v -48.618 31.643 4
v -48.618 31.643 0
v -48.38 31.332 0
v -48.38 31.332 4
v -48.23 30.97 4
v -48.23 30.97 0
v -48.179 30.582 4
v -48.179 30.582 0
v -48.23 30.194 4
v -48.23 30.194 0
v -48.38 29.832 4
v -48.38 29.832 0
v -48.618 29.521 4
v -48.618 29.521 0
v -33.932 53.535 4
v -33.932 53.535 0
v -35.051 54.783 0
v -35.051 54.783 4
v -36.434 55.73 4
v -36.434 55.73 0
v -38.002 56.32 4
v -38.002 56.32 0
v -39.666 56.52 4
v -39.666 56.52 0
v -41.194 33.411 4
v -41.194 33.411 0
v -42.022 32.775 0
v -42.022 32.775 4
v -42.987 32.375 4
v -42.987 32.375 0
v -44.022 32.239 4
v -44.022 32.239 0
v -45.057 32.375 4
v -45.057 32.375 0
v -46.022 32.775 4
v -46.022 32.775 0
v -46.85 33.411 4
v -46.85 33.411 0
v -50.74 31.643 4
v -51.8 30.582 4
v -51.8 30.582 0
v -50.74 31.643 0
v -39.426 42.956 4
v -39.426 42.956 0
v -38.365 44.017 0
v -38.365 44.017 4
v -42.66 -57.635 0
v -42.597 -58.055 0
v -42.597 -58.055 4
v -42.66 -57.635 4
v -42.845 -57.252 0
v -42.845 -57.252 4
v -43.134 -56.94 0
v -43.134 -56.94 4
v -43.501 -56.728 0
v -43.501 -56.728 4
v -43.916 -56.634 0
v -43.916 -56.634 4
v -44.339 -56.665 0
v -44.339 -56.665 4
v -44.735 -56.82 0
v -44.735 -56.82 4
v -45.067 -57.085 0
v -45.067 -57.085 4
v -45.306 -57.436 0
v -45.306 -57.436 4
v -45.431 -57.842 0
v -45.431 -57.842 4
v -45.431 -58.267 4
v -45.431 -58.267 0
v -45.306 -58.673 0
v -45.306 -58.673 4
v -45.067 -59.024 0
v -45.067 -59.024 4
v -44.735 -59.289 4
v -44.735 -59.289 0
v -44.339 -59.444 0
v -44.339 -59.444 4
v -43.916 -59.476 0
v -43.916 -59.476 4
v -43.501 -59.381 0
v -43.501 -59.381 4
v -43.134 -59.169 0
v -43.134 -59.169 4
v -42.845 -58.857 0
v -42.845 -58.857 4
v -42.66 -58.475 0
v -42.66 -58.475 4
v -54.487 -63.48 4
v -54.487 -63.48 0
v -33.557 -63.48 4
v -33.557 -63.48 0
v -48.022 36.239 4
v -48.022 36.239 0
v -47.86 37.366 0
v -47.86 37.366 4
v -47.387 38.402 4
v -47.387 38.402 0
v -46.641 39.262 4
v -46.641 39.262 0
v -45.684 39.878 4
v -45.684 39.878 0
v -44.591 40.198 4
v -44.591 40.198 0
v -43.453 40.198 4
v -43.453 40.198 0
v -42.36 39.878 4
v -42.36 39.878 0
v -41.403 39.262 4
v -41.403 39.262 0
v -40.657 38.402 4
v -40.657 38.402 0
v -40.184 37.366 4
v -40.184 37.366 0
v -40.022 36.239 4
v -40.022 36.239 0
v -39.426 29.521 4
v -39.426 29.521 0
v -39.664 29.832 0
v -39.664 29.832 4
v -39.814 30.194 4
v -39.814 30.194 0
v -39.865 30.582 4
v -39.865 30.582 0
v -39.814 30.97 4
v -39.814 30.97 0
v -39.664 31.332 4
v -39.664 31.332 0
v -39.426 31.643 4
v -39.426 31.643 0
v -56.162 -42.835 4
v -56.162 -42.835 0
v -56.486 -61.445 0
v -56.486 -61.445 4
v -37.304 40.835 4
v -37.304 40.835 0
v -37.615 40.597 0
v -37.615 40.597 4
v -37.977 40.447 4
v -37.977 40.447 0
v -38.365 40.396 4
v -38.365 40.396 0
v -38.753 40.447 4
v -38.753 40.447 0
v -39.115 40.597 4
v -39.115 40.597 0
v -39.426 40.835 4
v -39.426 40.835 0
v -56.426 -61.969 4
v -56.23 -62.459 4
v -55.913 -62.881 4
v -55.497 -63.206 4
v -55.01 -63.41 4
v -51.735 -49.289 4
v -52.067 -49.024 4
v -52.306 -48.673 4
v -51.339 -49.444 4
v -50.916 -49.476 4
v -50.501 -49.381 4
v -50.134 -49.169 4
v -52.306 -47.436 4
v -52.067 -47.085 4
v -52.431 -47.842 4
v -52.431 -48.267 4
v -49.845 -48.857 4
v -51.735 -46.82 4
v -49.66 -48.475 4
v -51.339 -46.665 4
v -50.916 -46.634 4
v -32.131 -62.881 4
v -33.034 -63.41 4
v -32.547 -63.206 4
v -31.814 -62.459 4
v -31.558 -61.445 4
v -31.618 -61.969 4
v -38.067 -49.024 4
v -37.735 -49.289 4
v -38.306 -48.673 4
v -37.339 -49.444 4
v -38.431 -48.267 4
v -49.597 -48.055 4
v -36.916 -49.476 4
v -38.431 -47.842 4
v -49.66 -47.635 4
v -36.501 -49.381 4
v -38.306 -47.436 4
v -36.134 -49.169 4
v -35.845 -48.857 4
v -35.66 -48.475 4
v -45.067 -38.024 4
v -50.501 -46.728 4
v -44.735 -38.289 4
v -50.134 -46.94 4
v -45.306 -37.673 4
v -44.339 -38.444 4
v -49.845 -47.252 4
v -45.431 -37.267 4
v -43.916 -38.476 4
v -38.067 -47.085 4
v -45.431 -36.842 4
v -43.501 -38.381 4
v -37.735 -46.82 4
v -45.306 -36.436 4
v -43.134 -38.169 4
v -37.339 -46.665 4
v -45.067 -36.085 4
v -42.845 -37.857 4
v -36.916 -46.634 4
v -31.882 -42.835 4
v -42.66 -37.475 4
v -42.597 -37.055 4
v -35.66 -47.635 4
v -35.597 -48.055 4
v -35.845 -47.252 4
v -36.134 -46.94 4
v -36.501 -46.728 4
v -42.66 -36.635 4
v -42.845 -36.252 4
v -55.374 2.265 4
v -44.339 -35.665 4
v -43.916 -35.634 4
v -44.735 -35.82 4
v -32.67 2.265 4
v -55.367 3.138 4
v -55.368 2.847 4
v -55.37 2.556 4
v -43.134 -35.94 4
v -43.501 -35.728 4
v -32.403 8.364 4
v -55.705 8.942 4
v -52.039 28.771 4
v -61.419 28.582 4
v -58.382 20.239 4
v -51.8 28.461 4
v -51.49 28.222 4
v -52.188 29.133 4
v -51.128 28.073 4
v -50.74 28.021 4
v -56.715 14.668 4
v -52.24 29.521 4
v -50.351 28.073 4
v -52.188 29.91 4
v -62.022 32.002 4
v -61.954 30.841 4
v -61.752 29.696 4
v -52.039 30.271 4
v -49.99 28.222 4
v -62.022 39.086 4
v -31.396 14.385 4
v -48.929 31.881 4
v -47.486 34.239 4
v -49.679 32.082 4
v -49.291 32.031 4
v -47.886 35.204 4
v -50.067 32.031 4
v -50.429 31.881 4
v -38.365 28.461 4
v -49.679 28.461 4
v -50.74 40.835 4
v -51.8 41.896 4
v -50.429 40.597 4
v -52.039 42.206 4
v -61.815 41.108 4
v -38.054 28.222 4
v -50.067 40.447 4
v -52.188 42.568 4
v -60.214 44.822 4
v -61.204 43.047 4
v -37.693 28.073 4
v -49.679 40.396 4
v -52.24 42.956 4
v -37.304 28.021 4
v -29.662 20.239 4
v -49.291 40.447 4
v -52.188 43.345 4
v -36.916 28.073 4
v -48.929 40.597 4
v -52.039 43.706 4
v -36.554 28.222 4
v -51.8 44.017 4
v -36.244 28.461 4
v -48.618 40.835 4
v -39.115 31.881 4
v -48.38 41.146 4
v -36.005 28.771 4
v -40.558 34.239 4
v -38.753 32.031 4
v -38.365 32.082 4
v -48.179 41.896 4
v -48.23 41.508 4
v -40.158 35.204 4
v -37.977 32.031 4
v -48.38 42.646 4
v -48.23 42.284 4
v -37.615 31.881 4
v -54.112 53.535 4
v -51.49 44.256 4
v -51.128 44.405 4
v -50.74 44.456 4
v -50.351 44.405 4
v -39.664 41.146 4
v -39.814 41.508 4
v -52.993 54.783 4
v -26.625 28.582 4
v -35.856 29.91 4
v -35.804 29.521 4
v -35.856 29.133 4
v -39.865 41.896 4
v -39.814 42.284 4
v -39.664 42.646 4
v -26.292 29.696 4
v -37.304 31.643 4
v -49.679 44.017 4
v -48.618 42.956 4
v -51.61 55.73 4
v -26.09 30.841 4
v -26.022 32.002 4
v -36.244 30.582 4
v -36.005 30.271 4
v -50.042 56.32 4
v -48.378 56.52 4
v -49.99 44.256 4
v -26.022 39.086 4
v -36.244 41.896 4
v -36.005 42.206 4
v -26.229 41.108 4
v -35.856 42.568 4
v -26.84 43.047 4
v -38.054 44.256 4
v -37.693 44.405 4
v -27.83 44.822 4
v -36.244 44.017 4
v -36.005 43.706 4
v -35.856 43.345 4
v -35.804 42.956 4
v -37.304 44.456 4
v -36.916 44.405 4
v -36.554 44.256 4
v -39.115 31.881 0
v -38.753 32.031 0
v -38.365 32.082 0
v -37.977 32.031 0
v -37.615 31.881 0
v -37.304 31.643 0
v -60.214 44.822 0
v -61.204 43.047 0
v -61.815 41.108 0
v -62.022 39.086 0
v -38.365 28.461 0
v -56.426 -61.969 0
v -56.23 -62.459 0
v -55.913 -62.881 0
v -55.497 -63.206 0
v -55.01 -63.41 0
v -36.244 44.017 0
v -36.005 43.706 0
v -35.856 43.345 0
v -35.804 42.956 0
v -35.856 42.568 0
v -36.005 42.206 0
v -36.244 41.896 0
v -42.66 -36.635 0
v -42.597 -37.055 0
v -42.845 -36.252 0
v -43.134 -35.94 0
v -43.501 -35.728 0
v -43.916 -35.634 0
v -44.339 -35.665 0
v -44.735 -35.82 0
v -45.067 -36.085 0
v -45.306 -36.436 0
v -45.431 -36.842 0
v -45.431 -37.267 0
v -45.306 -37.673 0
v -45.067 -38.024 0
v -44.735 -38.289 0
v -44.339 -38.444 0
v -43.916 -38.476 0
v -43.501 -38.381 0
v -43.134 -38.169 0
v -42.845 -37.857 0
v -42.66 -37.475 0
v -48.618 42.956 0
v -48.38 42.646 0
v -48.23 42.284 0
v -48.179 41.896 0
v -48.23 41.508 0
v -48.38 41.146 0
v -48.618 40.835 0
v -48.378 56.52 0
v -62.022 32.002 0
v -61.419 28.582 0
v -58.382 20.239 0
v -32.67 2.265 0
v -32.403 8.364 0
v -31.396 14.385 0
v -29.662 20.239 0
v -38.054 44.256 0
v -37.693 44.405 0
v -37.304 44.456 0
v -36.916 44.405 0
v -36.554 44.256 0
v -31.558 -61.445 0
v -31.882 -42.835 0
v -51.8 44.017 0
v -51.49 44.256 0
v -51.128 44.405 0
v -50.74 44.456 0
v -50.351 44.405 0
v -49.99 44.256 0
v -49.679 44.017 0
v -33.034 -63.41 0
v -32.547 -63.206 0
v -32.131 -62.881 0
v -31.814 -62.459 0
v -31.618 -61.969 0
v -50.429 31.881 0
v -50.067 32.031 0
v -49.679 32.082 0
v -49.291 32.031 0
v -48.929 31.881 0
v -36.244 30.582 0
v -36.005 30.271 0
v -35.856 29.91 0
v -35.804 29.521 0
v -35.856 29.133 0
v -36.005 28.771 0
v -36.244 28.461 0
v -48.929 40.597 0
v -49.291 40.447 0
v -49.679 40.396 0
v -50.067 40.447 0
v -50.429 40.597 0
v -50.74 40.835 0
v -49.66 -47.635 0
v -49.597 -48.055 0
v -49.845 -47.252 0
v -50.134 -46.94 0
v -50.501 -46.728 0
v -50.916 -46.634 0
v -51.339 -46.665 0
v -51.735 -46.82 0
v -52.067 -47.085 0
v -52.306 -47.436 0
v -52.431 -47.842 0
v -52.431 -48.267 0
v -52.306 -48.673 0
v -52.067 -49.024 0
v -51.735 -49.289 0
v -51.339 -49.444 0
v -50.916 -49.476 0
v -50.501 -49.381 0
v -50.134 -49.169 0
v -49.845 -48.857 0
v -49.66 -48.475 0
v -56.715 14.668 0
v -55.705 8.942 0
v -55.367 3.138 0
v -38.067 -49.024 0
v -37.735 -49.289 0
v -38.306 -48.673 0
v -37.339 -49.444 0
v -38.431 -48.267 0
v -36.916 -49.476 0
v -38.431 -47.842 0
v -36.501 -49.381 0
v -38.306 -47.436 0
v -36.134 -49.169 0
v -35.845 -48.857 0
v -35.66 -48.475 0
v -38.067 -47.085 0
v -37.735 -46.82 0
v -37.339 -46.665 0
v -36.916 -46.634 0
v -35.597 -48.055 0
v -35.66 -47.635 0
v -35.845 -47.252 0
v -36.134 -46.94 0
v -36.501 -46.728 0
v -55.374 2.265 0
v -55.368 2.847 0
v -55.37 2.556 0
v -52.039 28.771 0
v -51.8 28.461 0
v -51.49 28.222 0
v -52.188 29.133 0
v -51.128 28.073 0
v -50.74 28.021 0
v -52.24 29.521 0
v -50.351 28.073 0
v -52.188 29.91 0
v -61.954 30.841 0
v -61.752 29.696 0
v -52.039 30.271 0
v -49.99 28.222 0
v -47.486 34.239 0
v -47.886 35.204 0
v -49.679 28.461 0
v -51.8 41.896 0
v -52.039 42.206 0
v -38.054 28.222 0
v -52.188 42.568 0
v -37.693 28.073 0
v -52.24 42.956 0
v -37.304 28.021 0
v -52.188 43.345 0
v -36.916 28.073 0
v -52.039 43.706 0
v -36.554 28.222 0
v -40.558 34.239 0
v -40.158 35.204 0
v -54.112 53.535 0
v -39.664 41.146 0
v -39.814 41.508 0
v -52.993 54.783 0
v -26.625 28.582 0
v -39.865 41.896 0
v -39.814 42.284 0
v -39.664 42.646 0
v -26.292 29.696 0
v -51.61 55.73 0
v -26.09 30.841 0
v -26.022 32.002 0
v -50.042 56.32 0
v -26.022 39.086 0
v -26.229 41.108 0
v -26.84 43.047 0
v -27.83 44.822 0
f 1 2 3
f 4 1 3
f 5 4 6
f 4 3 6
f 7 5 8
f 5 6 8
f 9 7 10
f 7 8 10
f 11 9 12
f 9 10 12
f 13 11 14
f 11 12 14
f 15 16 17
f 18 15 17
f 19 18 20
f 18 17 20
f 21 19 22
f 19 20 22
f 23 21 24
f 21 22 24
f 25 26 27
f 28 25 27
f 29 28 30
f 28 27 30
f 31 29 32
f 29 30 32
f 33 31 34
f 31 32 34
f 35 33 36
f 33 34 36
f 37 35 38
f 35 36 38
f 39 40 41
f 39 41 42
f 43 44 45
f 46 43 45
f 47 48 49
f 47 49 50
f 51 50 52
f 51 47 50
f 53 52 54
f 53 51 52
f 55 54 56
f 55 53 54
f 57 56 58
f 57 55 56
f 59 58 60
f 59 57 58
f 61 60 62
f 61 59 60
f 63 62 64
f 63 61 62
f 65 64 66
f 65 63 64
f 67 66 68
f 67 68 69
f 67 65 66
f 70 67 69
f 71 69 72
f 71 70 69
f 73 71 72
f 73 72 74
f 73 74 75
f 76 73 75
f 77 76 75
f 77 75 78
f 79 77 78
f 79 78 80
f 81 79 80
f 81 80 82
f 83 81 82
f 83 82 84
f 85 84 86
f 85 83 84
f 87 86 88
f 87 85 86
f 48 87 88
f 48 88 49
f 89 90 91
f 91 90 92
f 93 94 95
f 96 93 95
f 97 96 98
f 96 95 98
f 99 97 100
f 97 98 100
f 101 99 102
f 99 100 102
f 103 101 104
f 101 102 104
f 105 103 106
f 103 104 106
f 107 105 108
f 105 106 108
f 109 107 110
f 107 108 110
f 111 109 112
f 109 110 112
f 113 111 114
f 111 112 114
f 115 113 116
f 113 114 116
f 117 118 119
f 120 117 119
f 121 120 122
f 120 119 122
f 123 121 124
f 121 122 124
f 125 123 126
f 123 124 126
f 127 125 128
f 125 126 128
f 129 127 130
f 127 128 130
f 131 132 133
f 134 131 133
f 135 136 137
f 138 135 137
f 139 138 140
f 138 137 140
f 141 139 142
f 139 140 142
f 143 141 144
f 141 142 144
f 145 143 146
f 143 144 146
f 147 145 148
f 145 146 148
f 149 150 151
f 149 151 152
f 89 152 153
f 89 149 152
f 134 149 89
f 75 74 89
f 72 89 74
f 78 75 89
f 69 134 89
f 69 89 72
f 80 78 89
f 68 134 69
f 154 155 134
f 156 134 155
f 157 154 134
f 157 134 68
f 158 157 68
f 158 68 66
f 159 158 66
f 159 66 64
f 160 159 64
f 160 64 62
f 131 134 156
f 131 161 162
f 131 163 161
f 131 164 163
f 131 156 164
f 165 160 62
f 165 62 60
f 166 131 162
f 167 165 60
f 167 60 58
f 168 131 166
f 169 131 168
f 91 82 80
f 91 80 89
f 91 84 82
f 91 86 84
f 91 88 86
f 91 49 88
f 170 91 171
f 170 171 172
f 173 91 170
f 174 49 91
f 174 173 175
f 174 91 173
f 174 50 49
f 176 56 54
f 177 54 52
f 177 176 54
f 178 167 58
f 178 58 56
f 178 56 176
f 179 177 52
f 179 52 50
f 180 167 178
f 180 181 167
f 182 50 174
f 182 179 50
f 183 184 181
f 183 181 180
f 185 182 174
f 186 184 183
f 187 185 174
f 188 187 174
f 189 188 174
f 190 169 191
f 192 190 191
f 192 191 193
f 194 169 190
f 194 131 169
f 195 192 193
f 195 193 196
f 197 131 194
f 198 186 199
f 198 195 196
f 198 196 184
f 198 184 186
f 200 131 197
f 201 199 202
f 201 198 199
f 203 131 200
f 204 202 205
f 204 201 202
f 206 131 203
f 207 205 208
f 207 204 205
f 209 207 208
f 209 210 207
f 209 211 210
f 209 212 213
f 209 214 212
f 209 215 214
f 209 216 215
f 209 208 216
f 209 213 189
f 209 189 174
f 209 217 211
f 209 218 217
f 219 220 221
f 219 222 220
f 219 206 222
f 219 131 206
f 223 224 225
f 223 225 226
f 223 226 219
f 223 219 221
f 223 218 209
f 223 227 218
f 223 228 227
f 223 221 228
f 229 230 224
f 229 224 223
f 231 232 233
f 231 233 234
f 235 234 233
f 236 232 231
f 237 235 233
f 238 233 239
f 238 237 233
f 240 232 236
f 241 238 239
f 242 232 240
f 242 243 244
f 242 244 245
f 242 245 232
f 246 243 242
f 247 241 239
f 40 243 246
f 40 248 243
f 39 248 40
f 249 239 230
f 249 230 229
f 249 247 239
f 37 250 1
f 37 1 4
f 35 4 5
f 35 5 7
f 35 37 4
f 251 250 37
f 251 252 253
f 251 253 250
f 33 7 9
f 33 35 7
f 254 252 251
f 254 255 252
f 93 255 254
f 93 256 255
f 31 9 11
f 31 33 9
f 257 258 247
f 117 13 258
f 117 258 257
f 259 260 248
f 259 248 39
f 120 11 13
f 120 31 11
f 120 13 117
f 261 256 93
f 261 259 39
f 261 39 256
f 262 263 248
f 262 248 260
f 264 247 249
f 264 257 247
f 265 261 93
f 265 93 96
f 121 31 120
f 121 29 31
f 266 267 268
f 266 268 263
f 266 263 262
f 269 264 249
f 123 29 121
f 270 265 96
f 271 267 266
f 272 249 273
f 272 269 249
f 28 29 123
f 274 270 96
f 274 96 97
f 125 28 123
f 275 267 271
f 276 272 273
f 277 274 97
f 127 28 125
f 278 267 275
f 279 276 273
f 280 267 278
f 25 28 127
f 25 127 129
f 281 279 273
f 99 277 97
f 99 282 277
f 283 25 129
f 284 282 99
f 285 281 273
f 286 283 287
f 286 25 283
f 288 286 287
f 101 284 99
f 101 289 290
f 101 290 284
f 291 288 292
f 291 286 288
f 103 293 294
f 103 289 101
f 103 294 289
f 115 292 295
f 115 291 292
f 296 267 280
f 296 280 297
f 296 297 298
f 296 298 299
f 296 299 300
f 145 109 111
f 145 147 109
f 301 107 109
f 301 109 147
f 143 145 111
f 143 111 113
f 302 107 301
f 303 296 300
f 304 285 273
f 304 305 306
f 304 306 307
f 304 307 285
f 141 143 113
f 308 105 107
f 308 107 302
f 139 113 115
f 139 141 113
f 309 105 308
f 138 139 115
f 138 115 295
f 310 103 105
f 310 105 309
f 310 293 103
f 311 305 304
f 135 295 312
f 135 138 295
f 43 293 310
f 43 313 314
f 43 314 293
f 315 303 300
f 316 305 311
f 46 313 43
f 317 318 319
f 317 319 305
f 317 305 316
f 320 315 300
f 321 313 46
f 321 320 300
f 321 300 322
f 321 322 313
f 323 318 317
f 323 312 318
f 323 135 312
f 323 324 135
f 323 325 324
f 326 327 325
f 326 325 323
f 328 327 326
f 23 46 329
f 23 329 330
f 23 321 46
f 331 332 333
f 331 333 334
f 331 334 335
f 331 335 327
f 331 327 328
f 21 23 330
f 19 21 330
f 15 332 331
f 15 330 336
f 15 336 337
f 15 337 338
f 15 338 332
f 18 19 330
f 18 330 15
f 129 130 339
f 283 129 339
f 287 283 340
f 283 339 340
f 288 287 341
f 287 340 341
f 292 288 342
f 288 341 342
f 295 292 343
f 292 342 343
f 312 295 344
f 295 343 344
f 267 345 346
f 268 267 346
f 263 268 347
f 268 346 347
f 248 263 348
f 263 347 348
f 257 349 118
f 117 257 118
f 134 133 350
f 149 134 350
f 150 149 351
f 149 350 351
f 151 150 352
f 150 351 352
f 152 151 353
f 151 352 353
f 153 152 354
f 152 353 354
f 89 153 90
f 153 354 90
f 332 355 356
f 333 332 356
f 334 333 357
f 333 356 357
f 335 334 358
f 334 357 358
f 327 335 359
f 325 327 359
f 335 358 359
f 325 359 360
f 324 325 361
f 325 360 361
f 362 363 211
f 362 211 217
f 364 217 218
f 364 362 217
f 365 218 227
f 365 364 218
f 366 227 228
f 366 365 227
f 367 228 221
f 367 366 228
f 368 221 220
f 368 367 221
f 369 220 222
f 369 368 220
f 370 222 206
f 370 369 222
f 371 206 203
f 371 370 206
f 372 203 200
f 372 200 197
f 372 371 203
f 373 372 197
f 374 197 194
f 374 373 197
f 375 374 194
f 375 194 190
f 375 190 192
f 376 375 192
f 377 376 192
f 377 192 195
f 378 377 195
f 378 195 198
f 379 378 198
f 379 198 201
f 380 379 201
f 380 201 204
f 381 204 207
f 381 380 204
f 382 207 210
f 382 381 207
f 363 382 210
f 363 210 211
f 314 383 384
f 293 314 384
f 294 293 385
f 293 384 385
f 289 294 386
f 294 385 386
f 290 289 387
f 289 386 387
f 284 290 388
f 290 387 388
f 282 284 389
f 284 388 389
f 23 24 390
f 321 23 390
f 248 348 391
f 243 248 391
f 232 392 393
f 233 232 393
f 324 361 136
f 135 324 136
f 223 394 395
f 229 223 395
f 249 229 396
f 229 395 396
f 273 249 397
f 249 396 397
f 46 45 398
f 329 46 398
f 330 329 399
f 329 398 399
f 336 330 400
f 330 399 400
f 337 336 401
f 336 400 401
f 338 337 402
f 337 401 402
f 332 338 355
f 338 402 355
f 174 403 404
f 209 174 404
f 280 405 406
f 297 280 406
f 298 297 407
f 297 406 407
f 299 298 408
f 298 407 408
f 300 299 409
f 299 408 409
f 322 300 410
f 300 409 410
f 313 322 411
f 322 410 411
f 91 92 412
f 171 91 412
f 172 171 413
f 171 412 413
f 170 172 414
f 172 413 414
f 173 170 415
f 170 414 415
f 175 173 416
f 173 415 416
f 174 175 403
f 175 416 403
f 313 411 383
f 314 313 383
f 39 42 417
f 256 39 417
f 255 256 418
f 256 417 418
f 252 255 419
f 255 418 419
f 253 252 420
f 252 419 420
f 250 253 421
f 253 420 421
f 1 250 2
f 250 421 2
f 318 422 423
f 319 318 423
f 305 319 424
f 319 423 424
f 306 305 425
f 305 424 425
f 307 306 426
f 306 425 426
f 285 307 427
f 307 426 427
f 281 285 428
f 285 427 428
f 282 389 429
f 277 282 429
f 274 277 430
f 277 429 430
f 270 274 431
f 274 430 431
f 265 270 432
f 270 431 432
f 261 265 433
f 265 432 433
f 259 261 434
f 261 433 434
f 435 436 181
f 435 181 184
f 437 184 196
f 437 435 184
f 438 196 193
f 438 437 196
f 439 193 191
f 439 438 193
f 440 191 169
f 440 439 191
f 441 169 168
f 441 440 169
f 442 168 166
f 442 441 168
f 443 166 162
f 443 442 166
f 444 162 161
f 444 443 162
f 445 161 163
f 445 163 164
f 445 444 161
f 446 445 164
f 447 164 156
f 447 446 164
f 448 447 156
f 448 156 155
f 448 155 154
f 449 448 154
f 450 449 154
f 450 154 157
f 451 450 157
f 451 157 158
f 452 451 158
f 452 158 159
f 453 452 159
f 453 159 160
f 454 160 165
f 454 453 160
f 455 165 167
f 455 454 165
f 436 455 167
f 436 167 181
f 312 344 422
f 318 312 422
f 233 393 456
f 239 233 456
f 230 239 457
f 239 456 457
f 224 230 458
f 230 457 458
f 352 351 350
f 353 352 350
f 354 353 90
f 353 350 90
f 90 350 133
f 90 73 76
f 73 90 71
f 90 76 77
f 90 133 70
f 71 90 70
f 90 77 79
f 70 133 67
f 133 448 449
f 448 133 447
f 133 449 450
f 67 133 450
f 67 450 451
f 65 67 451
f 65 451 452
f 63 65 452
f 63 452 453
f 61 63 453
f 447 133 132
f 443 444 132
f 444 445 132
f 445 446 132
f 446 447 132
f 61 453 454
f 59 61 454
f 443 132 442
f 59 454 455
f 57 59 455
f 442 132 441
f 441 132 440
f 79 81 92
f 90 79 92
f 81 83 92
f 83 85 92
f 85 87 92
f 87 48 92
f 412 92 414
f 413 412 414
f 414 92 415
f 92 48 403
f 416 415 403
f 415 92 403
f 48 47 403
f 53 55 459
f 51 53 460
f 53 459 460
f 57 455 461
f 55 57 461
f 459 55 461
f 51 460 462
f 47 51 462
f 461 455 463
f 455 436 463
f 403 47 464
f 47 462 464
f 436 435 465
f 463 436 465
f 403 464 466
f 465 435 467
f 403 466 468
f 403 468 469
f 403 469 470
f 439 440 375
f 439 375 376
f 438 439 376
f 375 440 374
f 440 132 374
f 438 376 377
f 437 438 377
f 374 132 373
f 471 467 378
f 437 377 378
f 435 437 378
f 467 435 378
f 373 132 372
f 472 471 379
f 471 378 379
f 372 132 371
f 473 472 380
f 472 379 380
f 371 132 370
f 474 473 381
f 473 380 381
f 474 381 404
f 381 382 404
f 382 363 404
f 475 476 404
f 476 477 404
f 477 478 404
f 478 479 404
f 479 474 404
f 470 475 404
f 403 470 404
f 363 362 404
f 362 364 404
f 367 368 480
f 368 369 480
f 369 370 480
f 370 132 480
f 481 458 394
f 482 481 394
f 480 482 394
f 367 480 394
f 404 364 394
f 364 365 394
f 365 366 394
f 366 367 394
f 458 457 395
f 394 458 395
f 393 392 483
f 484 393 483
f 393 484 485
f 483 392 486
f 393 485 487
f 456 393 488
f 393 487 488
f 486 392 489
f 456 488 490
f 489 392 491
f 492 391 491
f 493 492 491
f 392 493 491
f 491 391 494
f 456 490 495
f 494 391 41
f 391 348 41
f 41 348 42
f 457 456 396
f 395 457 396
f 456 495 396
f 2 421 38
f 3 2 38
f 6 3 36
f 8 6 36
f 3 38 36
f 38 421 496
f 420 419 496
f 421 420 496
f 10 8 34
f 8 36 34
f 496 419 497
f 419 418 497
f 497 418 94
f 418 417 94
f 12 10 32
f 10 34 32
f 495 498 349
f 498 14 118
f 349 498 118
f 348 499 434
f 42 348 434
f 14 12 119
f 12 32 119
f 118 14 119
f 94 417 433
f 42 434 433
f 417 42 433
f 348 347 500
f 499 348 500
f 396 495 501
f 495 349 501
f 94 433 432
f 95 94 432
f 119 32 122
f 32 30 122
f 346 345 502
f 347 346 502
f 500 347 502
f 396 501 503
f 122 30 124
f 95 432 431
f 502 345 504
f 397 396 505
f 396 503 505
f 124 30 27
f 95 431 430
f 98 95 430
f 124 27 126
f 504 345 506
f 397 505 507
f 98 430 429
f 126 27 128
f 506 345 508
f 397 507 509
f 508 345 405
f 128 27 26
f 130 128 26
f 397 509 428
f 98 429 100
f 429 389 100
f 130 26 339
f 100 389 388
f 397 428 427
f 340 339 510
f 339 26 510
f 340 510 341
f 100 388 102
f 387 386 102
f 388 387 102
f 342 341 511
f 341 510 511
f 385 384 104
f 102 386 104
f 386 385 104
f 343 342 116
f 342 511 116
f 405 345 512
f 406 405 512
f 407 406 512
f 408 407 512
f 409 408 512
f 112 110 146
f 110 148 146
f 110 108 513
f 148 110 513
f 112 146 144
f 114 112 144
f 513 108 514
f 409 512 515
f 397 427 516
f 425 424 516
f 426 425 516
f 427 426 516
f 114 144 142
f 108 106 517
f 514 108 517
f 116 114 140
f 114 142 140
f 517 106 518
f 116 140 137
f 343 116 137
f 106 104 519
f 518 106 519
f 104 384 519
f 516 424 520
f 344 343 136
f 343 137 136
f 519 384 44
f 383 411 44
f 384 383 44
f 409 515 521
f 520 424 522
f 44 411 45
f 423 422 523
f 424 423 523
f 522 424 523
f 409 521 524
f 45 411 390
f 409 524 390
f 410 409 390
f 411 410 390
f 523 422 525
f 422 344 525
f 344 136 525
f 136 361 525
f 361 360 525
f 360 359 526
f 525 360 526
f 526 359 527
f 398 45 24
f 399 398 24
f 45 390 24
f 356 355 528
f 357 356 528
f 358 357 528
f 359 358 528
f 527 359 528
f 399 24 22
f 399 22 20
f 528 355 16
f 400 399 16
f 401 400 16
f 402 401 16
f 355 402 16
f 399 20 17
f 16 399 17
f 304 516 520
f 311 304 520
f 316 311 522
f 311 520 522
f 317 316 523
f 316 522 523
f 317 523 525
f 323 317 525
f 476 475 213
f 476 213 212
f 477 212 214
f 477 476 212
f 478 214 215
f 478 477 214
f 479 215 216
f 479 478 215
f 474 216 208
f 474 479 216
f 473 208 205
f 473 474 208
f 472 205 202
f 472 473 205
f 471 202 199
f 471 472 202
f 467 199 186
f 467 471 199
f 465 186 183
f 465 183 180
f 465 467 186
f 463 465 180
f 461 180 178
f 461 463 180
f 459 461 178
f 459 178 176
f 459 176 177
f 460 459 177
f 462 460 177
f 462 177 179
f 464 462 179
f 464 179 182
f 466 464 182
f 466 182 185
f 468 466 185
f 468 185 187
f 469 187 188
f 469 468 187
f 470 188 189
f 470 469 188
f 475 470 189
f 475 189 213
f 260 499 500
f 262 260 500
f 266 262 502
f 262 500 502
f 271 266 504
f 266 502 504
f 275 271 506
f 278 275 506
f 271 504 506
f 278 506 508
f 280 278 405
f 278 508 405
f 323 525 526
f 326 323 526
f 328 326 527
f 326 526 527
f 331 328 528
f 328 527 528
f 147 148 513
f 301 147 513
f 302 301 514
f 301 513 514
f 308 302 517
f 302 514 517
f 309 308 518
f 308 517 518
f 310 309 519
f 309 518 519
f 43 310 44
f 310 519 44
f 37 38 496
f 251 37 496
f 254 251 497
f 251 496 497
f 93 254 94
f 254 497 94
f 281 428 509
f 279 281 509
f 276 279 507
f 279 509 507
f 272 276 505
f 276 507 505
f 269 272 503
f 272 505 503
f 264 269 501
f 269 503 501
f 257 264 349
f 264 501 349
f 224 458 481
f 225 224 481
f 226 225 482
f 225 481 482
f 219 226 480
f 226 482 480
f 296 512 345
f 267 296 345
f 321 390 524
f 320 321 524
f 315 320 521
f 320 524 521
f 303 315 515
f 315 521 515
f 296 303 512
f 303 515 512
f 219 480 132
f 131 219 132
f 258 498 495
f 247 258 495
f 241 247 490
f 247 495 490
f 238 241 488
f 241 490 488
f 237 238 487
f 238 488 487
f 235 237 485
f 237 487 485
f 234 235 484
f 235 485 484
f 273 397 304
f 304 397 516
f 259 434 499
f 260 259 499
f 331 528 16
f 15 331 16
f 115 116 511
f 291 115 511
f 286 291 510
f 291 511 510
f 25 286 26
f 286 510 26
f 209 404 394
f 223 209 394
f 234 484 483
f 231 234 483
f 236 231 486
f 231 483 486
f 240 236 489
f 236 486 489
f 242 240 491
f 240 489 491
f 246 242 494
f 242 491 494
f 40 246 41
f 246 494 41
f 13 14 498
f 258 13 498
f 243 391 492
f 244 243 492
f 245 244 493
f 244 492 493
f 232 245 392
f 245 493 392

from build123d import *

# Parameters (mm, degrees)
F0_R     = 1.425
F1_DEPTH = 4


# Not quite as in the source:
# - a feature names something its author has since deleted; it is built from what else it names


with BuildPart() as f1:
    # F0 (on Top) → F1 (new body)
    with BuildSketch(Plane.XY):
        with BuildLine():
            ThreePointArc((-32.6695806955, 2.2650205107), (-31.9914759382, 11.3900208154), (-29.6618269361, 20.2386473839))
            Line((-29.6618269361, 20.2386473839), (-32.8313113004, 11.5305606615))
            Line((-32.8313113004, 11.5305606615), (-32.6695806955, 2.2650205107))
        make_face()
        with BuildLine():
            Line((-55.2126988023, 11.5305606615), (-58.3821831004, 20.2386472017))
            ThreePointArc((-58.3821831004, 20.2386472017), (-56.126426517, 11.8200489678), (-55.3668141772, 3.1376401385))
            ThreePointArc((-55.3668141772, 3.1376401385), (-55.3687180209, 2.7013137107), (-55.3744294072, 2.2650205107))
            Line((-55.3744294072, 2.2650205107), (-55.2126988023, 11.5305606615))
        make_face()
        with BuildLine():
            Line((-39.6659744052, 56.5204558903), (-48.3780356975, 56.5204558903))
            ThreePointArc((-48.3780356975, 56.5204558903), (-51.6102759902, 55.7295317226), (-54.1121000075, 53.5354909448))
            Line((-54.1121000075, 53.5354909448), (-60.2135254943, 44.8217522976))
            ThreePointArc((-60.2135254943, 44.8217522976), (-61.5591745589, 42.0930459292), (-62.0220050514, 39.0859879341))
            Line((-62.0220050514, 39.0859879341), (-62.0220050514, 36.2389758229))
            Line((-62.0220050514, 36.2389758229), (-48.0220050514, 36.2389758229))
            ThreePointArc((-48.0220050514, 36.2389758229), (-44.0220050514, 40.2389758229), (-40.0220050514, 36.2389758229))
            Line((-40.0220050514, 36.2389758229), (-26.0220050514, 36.2389758229))
            Line((-26.0220050514, 36.2389758229), (-26.0220050514, 39.0859879341))
            ThreePointArc((-26.0220050514, 39.0859879341), (-26.4848355439, 42.0930459292), (-27.8304846085, 44.8217522976))
            Line((-27.8304846085, 44.8217522976), (-33.9319100952, 53.5354909448))
            ThreePointArc((-33.9319100952, 53.5354909448), (-36.4337341126, 55.7295317226), (-39.6659744052, 56.5204558903))
        make_face()
        with BuildLine():
            Line((-49.6788593009, 44.017150416), (-48.6181991291, 42.9564902442))
            ThreePointArc((-48.6181991291, 42.9564902442), (-48.1788593009, 41.8958300724), (-48.6181991291, 40.8351699006))
            ThreePointArc((-48.6181991291, 40.8351699006), (-49.6788593009, 40.3958300724), (-50.7395194726, 40.8351699006))
            Line((-50.7395194726, 40.8351699006), (-51.8001796444, 41.8958300724))
            ThreePointArc((-51.8001796444, 41.8958300724), (-52.2395194726, 42.9564902442), (-51.8001796444, 44.017150416))
            ThreePointArc((-51.8001796444, 44.017150416), (-50.7395194726, 44.4564902442), (-49.6788593009, 44.017150416))
        make_face(mode=Mode.SUBTRACT)
        with BuildLine():
            ThreePointArc((-36.2438304583, 44.017150416), (-35.8044906301, 42.9564902442), (-36.2438304583, 41.8958300724))
            Line((-36.2438304583, 41.8958300724), (-37.3044906301, 40.8351699006))
            ThreePointArc((-37.3044906301, 40.8351699006), (-38.3651508019, 40.3958300724), (-39.4258109737, 40.8351699006))
            ThreePointArc((-39.4258109737, 40.8351699006), (-39.8651508019, 41.8958300724), (-39.4258109737, 42.9564902442))
            Line((-39.4258109737, 42.9564902442), (-38.3651508019, 44.017150416))
            ThreePointArc((-38.3651508019, 44.017150416), (-37.3044906301, 44.4564902442), (-36.2438304583, 44.017150416))
        make_face(mode=Mode.SUBTRACT)
        with BuildLine():
            Line((-31.557524447, -61.4446392968), (-31.8823640322, -42.8345919221))
            ThreePointArc((-31.8823640322, -42.8345919221), (-44.0220050514, -43.7610241771), (-56.1616460705, -42.8345919221))
            Line((-56.1616460705, -42.8345919221), (-56.4864856557, -61.4446392968))
            ThreePointArc((-56.4864856557, -61.4446392968), (-55.9132911637, -62.8813626383), (-54.4867902654, -63.4795441097))
            Line((-54.4867902654, -63.4795441097), (-33.5572198373, -63.4795441097))
            ThreePointArc((-33.5572198373, -63.4795441097), (-32.130718939, -62.8813626383), (-31.557524447, -61.4446392968))
        make_face()
        with Locations((-51.0220050514, -58.0545441097)):
            Circle(F0_R, mode=Mode.SUBTRACT)
        with Locations((-51.0220050514, -48.0545441097)):
            Circle(F0_R, mode=Mode.SUBTRACT)
        with Locations((-44.0220050514, -58.0545441097)):
            Circle(F0_R, mode=Mode.SUBTRACT)
        with Locations((-37.0220050514, -58.0545441097)):
            Circle(F0_R, mode=Mode.SUBTRACT)
        with Locations((-37.0220050514, -48.0545441097)):
            Circle(F0_R, mode=Mode.SUBTRACT)
        with BuildLine():
            Line((-48.0220050514, 36.2389758229), (-62.0220050514, 36.2389758229))
            Line((-62.0220050514, 36.2389758229), (-62.0220050514, 32.00224563))
            ThreePointArc((-62.0220050514, 32.00224563), (-61.8700825815, 30.2657638533), (-61.4189312592, 28.5820441968))
            Line((-61.4189312592, 28.5820441968), (-58.3821831004, 20.2386472017))
            Line((-58.3821831004, 20.2386472017), (-55.2126988023, 11.5305606615))
            Line((-55.2126988023, 11.5305606615), (-55.3744294072, 2.2650205107))
            Line((-55.3744294072, 2.2650205107), (-56.1616460705, -42.8345919221))
            ThreePointArc((-56.1616460705, -42.8345919221), (-44.0220050514, -43.7610241771), (-31.8823640322, -42.8345919221))
            Line((-31.8823640322, -42.8345919221), (-32.6695806955, 2.2650205107))
            Line((-32.6695806955, 2.2650205107), (-32.8313113004, 11.5305606615))
            Line((-32.8313113004, 11.5305606615), (-29.6618269361, 20.2386473839))
            Line((-29.6618269361, 20.2386473839), (-26.6250788435, 28.5820441968))
            ThreePointArc((-26.6250788435, 28.5820441968), (-26.1739275213, 30.2657638533), (-26.0220050514, 32.00224563))
            Line((-26.0220050514, 32.00224563), (-26.0220050514, 36.2389758229))
            Line((-26.0220050514, 36.2389758229), (-40.0220050514, 36.2389758229))
            ThreePointArc((-40.0220050514, 36.2389758229), (-40.3264869213, 34.7082420935), (-41.1935779266, 33.4105486982))
            ThreePointArc((-41.1935779266, 33.4105486982), (-44.0220050514, 32.2389758229), (-46.8504321761, 33.4105486982))
            ThreePointArc((-46.8504321761, 33.4105486982), (-47.7175231814, 34.7082420935), (-48.0220050514, 36.2389758229))
        make_face()
        with Locations((-44.0220050514, -37.0545441097)):
            Circle(F0_R, mode=Mode.SUBTRACT)
        with BuildLine():
            ThreePointArc((-50.7395194726, 31.6427817452), (-49.6788593009, 32.0821215734), (-48.6181991291, 31.6427817452))
            ThreePointArc((-48.6181991291, 31.6427817452), (-48.1788593009, 30.5821215734), (-48.6181991291, 29.5214614017))
            Line((-48.6181991291, 29.5214614017), (-49.6788593009, 28.4608012299))
            ThreePointArc((-49.6788593009, 28.4608012299), (-50.7395194726, 28.0214614017), (-51.8001796444, 28.4608012299))
            ThreePointArc((-51.8001796444, 28.4608012299), (-52.2395194726, 29.5214614017), (-51.8001796444, 30.5821215734))
            Line((-51.8001796444, 30.5821215734), (-50.7395194726, 31.6427817452))
        make_face(mode=Mode.SUBTRACT)
        with BuildLine():
            ThreePointArc((-39.4258109737, 29.5214614017), (-39.8651508019, 30.5821215734), (-39.4258109737, 31.6427817452))
            ThreePointArc((-39.4258109737, 31.6427817452), (-38.3651508019, 32.0821215734), (-37.3044906301, 31.6427817452))
            Line((-37.3044906301, 31.6427817452), (-36.2438304583, 30.5821215734))
            ThreePointArc((-36.2438304583, 30.5821215734), (-35.8044906301, 29.5214614017), (-36.2438304583, 28.4608012299))
            ThreePointArc((-36.2438304583, 28.4608012299), (-37.3044906301, 28.0214614017), (-38.3651508019, 28.4608012299))
            Line((-38.3651508019, 28.4608012299), (-39.4258109737, 29.5214614017))
        make_face(mode=Mode.SUBTRACT)
        with Locations((-51.0220050514, -58.0545441097)):
            Circle(F0_R)
        with Locations((-37.0220050514, -58.0545441097)):
            Circle(F0_R)
    extrude(amount=F1_DEPTH)


solid = f1.part
